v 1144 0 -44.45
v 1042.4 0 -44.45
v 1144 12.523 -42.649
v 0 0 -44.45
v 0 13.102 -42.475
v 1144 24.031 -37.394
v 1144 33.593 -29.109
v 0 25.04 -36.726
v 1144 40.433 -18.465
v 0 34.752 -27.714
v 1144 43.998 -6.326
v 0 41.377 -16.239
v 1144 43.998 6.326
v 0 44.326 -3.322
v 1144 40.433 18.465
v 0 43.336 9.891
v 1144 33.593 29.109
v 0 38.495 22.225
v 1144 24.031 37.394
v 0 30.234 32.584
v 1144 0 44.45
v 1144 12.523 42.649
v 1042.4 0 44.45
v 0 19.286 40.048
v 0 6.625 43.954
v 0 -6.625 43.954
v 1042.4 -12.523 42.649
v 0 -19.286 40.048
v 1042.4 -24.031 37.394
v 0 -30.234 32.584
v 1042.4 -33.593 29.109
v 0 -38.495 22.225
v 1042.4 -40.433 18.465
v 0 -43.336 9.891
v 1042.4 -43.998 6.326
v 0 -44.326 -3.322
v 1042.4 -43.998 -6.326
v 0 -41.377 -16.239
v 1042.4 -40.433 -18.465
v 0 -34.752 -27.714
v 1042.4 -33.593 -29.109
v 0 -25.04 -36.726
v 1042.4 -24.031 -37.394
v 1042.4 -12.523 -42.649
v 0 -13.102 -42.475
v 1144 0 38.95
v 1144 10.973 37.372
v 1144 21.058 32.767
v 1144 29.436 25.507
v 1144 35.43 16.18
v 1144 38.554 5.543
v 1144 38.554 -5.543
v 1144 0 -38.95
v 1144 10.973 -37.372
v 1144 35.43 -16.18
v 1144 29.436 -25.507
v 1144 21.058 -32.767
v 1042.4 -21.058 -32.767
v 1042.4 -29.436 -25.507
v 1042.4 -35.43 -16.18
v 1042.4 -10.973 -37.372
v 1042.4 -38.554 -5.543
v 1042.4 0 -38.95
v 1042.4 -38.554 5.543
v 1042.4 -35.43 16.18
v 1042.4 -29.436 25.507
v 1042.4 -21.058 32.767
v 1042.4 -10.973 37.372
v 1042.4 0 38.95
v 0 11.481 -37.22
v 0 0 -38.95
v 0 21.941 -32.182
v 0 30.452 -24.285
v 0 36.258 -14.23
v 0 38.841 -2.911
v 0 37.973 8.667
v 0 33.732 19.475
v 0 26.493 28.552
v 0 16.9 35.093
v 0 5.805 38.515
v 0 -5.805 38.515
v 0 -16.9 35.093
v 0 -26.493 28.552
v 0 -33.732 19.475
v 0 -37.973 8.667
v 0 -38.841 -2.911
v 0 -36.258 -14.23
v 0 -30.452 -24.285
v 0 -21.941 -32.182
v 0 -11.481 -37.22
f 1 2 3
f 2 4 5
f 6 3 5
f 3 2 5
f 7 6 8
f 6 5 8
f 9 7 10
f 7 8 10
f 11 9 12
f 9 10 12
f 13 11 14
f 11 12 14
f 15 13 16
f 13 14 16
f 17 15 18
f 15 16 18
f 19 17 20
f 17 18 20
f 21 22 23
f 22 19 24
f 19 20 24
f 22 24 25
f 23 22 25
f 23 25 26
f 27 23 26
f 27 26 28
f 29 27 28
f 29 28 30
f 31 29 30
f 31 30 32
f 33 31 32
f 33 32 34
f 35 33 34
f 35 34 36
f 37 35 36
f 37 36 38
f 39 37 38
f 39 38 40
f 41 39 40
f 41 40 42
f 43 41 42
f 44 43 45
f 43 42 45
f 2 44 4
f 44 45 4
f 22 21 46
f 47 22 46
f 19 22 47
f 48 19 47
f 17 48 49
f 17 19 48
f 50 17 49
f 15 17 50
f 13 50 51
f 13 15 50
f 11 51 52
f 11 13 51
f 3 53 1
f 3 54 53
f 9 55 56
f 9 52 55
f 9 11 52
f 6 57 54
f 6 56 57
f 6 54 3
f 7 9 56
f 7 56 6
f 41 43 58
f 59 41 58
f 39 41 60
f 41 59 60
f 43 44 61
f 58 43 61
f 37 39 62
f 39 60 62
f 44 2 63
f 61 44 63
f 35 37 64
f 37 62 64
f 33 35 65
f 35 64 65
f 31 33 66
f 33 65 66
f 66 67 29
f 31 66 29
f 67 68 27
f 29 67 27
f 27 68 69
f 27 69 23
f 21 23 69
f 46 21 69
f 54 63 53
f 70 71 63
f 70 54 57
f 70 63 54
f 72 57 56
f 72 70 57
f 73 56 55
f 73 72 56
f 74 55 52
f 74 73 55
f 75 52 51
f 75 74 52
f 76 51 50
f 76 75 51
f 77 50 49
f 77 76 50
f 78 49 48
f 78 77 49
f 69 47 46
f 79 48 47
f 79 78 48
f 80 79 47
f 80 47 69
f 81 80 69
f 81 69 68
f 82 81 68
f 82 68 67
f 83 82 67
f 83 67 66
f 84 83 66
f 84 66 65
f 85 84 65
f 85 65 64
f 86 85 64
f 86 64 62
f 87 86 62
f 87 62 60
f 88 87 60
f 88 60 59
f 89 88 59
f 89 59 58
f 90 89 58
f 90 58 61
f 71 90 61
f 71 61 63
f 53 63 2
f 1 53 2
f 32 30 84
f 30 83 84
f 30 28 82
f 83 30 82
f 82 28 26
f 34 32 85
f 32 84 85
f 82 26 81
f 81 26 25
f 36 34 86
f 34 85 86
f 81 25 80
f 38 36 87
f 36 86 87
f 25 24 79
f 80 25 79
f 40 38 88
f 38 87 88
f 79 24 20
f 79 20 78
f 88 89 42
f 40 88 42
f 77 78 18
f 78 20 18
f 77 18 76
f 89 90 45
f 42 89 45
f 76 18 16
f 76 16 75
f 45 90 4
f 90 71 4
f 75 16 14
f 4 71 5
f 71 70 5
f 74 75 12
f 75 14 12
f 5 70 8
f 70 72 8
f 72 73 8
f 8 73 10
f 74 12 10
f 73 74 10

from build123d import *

# Parameters (mm, degrees)
CROQUIS1_R              = 44.45
CROQUIS1_R_2            = 38.95
SALIENTE_EXTRUIR1_DEPTH = 1144
CORTAR_EXTRUIR1_START   = -101.6
CORTAR_EXTRUIR1_DEPTH   = 101.6


with BuildPart() as part:
    # Croquis1 → Saliente-Extruir1 (new body)
    with BuildSketch(Plane(origin=(0, 0, 0), x_dir=(0, 0, -1), z_dir=(1, 0, 0))):
        Circle(CROQUIS1_R)
        Circle(CROQUIS1_R_2, mode=Mode.SUBTRACT)
    extrude(amount=SALIENTE_EXTRUIR1_DEPTH)

    # Croquis3 → Cortar-Extruir1 (cut)
    with BuildSketch(Plane(origin=(1144, 0, 0), x_dir=(0, 0, -1), z_dir=(1, 0, 0)).offset(CORTAR_EXTRUIR1_START)):
        with BuildLine():
            Line((-44.45, 0), (-38.95, 0))
            ThreePointArc((-38.95, 0), (0, -38.95), (38.95, 0))
            Line((38.95, 0), (44.45, 0))
            ThreePointArc((44.45, 0), (0, -44.45), (-44.45, 0))
        make_face()
    extrude(amount=CORTAR_EXTRUIR1_DEPTH, mode=Mode.SUBTRACT)


solid = part.part
